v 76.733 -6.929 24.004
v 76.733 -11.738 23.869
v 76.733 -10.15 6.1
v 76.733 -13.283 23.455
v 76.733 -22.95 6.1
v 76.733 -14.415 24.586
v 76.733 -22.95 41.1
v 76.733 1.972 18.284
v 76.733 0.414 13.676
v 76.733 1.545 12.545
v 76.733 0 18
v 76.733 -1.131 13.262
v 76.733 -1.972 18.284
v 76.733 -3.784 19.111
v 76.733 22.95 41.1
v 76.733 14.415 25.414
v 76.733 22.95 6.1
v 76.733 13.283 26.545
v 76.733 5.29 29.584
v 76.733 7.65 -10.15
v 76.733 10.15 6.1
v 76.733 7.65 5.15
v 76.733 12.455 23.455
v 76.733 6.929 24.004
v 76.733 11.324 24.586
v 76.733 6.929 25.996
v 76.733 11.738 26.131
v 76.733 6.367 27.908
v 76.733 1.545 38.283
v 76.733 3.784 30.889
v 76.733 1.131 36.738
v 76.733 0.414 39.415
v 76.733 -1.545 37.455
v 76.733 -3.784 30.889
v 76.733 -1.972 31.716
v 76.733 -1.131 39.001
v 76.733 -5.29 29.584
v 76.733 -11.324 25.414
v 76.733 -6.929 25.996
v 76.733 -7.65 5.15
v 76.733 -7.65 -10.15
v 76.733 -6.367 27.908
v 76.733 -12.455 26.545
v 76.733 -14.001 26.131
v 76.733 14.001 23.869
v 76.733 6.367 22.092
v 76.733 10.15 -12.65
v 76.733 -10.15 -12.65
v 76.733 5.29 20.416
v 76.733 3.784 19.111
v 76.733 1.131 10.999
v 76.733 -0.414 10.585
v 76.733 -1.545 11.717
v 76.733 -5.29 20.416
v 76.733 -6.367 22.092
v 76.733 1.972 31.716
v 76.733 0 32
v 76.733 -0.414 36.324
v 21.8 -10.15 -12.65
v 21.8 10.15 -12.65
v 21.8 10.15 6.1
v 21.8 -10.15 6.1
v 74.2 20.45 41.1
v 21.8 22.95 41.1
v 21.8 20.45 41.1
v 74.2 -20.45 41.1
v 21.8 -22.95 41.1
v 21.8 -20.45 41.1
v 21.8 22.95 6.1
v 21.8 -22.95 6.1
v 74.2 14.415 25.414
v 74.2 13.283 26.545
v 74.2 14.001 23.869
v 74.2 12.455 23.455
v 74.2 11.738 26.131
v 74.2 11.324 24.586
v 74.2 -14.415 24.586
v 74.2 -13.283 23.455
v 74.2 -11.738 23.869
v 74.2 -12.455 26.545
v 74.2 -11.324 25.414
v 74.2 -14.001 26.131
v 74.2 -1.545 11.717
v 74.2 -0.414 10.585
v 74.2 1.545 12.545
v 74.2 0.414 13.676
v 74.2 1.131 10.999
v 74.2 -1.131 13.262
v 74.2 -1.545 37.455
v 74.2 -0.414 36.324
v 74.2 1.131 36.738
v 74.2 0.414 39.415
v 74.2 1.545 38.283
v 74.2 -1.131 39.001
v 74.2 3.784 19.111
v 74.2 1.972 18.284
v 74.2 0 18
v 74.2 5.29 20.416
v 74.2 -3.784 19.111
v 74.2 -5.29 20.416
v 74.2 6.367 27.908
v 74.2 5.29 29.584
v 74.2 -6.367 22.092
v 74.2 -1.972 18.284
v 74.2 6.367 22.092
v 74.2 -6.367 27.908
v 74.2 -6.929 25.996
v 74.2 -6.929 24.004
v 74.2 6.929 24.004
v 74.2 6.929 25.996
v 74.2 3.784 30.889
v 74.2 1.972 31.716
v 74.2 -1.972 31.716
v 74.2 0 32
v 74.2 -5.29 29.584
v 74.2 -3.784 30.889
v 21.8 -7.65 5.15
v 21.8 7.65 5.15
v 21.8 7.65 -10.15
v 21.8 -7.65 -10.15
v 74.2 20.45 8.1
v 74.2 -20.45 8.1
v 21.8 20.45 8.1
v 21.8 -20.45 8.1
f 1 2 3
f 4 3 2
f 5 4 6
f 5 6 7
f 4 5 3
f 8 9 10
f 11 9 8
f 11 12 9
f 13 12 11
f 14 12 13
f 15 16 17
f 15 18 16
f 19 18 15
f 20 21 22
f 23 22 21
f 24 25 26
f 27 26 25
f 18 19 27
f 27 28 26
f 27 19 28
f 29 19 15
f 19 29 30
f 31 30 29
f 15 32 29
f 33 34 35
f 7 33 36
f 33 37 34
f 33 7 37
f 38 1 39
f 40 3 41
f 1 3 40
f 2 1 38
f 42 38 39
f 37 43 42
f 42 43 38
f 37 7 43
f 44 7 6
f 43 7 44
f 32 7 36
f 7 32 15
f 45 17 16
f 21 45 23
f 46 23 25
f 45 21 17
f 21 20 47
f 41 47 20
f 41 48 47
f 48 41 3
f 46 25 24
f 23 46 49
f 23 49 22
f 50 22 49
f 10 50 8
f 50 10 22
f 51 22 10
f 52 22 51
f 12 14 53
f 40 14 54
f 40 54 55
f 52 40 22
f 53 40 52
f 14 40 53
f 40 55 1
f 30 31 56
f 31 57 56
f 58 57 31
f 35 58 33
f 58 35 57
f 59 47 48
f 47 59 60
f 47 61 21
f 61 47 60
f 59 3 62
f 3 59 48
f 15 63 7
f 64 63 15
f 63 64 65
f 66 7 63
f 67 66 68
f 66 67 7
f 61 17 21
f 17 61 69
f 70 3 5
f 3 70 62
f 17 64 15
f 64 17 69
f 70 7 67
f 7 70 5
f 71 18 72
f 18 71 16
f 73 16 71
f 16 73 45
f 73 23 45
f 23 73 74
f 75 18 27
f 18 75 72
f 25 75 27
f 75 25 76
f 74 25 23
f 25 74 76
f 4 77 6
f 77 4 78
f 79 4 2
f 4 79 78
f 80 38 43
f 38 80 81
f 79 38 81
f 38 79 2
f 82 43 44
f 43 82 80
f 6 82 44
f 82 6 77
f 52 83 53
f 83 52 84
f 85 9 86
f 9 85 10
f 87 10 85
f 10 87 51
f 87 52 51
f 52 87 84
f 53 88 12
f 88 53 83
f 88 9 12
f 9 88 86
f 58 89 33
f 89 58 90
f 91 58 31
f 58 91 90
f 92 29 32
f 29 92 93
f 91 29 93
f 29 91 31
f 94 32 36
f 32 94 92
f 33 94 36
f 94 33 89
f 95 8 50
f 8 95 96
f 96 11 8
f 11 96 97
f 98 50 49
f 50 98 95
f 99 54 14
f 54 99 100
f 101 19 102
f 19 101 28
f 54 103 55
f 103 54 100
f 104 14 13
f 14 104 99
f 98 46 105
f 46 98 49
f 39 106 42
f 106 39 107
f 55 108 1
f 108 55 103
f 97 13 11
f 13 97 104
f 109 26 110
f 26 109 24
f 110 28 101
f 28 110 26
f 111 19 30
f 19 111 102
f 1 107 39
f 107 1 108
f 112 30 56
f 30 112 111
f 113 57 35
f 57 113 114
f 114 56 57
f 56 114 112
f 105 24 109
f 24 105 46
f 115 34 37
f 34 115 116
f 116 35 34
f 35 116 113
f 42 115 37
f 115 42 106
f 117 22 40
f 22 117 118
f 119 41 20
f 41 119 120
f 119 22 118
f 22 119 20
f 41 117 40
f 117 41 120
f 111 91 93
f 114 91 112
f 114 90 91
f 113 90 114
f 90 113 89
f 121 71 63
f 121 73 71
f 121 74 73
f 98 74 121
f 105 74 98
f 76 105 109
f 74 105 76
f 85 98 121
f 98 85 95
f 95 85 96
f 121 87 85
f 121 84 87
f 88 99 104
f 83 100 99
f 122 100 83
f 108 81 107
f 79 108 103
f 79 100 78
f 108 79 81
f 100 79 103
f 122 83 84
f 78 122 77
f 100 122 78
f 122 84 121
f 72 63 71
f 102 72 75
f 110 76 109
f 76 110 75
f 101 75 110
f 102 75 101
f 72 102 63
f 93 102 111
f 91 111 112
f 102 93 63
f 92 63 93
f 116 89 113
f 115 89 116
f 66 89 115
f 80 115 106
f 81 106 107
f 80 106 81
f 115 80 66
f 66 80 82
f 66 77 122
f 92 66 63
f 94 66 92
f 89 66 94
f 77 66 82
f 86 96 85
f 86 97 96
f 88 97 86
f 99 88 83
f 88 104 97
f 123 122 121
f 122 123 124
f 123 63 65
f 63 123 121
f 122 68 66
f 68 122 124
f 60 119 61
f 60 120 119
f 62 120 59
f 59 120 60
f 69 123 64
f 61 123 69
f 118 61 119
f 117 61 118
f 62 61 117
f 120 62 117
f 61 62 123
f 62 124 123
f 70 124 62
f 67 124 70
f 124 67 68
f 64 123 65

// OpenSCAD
hranol = 15.3;
trubicka = 12.2;
edge = 5;

delka = 70 + trubicka + edge;

module so239()
{
    so239_screw = 3.2;
    so239_screw_distance = 18.2;
    so239_mount_size = 25.4;
    wall_thickness = 5;

    cylinder(h = 8, d = 14);

    translate([0, 0, 10]) rotate([0, 0, 45])
    {
        translate([+so239_screw_distance / 2, +so239_screw_distance / 2, -5]) cylinder(h = wall_thickness * 3, d = 3.2, center = true);
        translate([-so239_screw_distance / 2, -so239_screw_distance / 2, -5]) cylinder(h = wall_thickness * 3, d = 3.2, center = true);
        translate([+so239_screw_distance / 2, -so239_screw_distance / 2, -5]) cylinder(h = wall_thickness * 3, d = 3.2, center = true);
        translate([-so239_screw_distance / 2, +so239_screw_distance / 2, -5]) cylinder(h = wall_thickness * 3, d = 3.2, center = true);
    }

}


module radiator()
{
    difference()
    {
        rotate([90, 0, 0]) cylinder(d=(trubicka + edge), h=80, center=true);


        rotate([90, 0, 0]) cylinder(d= trubicka, h = 1000, center = true);
        rotate([90, 0, 0]) cylinder(d= trubicka + edge + 1, h = 20, center = true);
    }
}

module radiatorBox()
    difference()
{
    union()
    {
        difference()
        {
            translate([delka / 3 + trubicka / 3, 0, 0]) union()
            {
                translate([0,0,-edge/2]) cube([delka, hranol + edge, hranol + edge], center = true);
                translate([0, 0, (35 + trubicka) / 2]) cube([delka, 3 * hranol, 35], center = true);
            }

            translate([0,0,-edge/2]) cube([1400, hranol, hranol], center = true);

            translate([(delka - edge) / 2 - 8, 0, (35 + trubicka) / 2 + 2]) cube([delka - edge, 3 * hranol - edge, 35], center = true);
            translate([70, 0, 25]) rotate([0, 90, 0]) so239();
        }
        translate([-edge / 3, 0, (hranol + trubicka) / 2-2])  radiator();
    }
    translate([-edge / 3, 0, (hranol + trubicka) / 2-2]) rotate([90, 0, 0]) cylinder(d = trubicka, h = 1000, center = true);
}

//intersection()
difference()
{
    radiatorBox();
    cube([delka / 2, delka, delka], center = true);
}
